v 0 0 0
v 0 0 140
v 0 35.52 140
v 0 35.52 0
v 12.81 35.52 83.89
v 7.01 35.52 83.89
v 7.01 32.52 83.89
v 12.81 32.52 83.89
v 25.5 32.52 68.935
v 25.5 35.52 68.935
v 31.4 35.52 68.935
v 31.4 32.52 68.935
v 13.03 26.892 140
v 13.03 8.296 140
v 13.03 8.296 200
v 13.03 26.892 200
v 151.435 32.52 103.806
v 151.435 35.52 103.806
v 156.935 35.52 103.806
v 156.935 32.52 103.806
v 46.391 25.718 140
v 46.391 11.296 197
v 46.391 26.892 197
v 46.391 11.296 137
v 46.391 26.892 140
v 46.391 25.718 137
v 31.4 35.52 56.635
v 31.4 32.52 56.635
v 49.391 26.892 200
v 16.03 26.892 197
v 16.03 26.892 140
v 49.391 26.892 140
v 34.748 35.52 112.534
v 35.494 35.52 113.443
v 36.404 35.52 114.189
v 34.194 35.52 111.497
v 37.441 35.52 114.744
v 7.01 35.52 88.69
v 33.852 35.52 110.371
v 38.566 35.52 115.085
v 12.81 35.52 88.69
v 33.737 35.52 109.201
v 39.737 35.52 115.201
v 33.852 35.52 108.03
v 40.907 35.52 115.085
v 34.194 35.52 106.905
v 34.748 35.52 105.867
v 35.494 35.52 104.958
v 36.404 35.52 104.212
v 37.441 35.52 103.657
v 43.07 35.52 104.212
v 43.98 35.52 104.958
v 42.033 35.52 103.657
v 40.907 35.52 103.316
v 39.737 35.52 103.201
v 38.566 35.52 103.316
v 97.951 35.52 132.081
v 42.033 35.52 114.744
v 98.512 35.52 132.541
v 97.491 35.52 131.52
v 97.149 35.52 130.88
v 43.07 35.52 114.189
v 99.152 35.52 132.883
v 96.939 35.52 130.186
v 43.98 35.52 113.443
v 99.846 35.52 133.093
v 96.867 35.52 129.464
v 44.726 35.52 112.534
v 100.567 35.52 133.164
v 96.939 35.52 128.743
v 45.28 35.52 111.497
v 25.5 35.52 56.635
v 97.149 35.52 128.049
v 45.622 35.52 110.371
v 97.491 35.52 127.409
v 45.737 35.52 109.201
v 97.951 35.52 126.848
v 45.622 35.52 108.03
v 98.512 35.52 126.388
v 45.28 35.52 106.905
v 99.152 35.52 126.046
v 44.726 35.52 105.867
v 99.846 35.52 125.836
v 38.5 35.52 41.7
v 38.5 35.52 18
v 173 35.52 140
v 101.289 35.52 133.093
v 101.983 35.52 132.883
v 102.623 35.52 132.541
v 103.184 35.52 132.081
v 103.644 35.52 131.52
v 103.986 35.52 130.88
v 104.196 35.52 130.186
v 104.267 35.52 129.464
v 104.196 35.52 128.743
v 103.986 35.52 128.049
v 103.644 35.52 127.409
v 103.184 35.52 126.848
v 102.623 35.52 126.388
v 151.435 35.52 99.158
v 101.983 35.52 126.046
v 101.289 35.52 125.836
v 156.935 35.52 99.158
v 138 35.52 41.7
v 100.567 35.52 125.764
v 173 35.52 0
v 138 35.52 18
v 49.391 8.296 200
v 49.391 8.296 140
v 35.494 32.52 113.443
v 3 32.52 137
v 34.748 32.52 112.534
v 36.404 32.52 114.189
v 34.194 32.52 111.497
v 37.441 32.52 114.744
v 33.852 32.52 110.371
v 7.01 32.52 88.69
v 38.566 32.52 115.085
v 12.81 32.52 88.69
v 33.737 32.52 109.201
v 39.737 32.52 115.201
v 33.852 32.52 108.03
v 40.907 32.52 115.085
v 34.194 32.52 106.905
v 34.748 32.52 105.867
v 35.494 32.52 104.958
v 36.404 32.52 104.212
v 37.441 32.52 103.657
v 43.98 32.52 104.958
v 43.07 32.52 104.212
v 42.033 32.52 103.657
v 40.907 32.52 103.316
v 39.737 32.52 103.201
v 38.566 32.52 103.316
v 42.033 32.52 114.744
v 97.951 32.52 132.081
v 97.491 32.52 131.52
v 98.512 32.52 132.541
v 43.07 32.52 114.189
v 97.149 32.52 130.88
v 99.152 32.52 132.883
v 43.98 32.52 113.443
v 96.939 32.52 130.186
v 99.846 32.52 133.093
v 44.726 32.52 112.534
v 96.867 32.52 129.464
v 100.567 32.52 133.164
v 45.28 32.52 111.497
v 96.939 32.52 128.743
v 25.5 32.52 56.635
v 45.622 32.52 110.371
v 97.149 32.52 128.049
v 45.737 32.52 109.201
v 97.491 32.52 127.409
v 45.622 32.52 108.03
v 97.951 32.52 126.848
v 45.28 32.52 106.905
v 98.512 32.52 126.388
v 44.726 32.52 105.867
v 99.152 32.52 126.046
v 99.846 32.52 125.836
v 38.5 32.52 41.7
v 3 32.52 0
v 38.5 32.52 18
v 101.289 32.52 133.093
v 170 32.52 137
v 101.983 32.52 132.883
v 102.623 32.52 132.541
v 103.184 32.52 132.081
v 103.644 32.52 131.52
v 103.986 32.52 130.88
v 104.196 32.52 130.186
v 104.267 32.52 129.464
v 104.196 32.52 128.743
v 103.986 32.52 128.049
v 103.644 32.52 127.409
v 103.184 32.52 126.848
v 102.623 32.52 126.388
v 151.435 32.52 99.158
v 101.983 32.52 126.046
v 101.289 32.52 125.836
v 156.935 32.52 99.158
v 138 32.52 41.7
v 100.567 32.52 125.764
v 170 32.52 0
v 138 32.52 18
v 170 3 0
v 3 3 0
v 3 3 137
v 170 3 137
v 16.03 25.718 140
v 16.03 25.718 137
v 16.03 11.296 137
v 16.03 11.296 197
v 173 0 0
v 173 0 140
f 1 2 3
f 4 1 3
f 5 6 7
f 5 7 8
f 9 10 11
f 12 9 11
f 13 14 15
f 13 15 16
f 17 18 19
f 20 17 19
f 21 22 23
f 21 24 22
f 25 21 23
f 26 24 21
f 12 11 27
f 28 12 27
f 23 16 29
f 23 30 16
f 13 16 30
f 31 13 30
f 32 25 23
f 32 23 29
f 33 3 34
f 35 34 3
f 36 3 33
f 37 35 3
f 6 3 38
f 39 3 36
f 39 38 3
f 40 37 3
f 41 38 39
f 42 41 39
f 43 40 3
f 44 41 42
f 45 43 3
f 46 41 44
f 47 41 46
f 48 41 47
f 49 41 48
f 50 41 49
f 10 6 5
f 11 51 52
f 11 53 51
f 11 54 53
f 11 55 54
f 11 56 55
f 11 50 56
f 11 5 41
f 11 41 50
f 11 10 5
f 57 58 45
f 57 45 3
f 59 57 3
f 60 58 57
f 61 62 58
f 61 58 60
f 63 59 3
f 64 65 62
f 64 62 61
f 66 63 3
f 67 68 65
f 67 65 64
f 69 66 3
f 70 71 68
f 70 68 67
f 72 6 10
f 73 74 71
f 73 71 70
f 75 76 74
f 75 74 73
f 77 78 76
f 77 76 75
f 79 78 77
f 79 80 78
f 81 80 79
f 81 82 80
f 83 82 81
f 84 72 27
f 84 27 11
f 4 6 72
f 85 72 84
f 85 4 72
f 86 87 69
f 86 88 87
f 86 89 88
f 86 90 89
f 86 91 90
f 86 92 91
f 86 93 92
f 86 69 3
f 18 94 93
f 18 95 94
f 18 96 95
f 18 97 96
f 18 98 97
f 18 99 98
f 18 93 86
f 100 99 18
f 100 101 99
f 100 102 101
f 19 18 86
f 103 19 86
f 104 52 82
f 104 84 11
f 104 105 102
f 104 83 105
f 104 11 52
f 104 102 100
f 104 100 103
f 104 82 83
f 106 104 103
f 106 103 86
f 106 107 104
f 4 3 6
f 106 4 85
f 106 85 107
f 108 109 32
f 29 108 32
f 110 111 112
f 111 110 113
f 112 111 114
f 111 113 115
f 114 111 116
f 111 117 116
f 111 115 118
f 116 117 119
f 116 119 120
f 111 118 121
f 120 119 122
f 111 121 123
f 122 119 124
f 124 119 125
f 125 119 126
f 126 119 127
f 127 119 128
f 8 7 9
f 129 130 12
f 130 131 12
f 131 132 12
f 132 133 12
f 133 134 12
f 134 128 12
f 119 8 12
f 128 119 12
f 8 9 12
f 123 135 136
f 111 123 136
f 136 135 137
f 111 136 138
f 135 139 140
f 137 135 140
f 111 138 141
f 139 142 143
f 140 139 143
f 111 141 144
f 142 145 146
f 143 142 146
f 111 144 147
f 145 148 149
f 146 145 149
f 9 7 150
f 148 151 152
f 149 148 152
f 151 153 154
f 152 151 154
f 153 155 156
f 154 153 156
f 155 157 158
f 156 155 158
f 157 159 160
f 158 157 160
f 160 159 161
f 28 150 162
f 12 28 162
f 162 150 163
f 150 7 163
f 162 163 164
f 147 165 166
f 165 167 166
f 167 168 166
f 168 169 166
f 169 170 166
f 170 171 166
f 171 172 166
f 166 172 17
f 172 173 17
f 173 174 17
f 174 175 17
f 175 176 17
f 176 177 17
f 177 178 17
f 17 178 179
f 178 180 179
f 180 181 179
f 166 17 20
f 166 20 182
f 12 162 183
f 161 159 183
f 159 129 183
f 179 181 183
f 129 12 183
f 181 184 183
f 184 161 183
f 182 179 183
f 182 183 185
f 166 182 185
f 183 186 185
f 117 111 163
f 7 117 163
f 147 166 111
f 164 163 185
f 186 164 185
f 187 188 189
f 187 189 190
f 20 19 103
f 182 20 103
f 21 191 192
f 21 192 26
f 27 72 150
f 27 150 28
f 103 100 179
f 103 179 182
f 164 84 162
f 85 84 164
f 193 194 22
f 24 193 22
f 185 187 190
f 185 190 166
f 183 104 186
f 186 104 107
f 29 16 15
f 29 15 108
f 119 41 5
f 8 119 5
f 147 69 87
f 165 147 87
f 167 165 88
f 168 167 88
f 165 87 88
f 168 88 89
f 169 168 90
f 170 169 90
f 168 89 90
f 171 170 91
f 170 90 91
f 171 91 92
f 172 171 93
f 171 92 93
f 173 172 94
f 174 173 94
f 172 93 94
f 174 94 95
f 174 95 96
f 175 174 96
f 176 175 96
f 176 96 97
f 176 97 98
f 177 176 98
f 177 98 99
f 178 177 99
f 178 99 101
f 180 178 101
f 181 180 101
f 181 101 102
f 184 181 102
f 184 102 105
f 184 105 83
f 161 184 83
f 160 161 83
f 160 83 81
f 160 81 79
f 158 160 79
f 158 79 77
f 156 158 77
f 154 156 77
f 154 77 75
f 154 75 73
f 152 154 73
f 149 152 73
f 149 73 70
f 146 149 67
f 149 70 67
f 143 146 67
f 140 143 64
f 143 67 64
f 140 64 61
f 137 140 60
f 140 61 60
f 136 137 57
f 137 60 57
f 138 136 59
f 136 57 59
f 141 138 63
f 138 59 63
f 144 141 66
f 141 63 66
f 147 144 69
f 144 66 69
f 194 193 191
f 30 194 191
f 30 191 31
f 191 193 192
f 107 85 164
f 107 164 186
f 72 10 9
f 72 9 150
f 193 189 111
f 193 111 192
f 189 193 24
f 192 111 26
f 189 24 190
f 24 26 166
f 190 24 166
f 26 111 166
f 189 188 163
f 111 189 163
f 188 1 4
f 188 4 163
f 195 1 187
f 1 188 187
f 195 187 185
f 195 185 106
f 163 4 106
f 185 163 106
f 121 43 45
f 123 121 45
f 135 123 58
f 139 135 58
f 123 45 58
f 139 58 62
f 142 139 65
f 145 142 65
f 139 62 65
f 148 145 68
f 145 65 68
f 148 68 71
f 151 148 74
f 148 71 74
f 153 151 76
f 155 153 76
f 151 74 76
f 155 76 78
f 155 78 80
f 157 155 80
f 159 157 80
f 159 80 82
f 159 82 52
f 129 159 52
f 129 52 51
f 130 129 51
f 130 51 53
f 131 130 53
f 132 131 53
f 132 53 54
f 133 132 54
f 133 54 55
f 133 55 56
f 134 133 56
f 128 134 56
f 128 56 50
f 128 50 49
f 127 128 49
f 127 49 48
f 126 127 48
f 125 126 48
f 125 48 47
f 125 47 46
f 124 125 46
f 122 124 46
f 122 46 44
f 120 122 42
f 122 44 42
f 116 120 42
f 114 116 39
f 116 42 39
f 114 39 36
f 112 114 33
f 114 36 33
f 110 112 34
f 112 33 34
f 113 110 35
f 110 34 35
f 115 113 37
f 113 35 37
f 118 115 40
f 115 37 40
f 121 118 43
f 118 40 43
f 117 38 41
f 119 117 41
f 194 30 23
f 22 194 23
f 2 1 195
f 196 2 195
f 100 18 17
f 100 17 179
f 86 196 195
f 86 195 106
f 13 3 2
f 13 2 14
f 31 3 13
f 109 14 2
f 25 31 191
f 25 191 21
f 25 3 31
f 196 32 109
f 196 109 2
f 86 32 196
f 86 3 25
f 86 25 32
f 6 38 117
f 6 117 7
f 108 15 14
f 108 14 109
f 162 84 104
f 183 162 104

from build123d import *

# Parameters (mm, degrees)
SKETCH1_W           = 173
SKETCH1_H           = 35.519872746
BOSS_EXTRUDE2_DEPTH = 140
SHELL3_T            = -3
SKETCH3_R           = 6
SKETCH3_R_2         = 3.7
SKETCH3_W           = 99.5
SKETCH3_H           = 23.7
SKETCH3_W_2         = 5.9
SKETCH3_H_2         = 12.3
SKETCH3_W_3         = 5.800374035
SKETCH3_H_3         = 4.8
SKETCH3_W_4         = 5.5
SKETCH3_H_4         = 4.647872836
CUT_EXTRUDE3_DEPTH  = 7.5
SKETCH5_W           = 36.361516307
SKETCH5_H           = 18.595843956
BOSS_EXTRUDE4_DEPTH = 60
SHELL5_START        = 140
SHELL5_OUTLINE_W    = 30.361516307
SHELL5_OUTLINE_H    = 15.595843956
SHELL5_DEPTH        = 57
SKETCH8_W           = 30.361516307
SKETCH8_H           = 14.422474908
CUT_EXTRUDE6_DEPTH  = 20.5


# Read off the part's stored shape, not the designer's step: Shell5
with BuildPart() as part:
    # Sketch1 → Boss-Extrude2 (new body)
    with BuildSketch(Plane.XY):
        with Locations((86.5, 17.759936373)):
            Rectangle(SKETCH1_W, SKETCH1_H)
    extrude(amount=BOSS_EXTRUDE2_DEPTH)

    # Shell3
    shell3_openings = [part.faces().sort_by_distance(p)[0] for p in [
        (86.5, 17.759936373, 0),
    ]]
    offset(amount=SHELL3_T, openings=shell3_openings, kind=Kind.INTERSECTION)

    # Sketch3 → Cut-Extrude3 (cut)
    with BuildSketch(Plane(origin=(0, 35.519872746, 0), x_dir=(1, 0, 0), z_dir=(0, 1, 0))):
        with Locations(Location((39.736956851, -109.200672262, 0), (0, 0, 270))):
            Circle(SKETCH3_R)
        with Locations(Location((100.567495644, -129.464431968, 0), (0, 0, 270))):
            Circle(SKETCH3_R_2)
        with Locations((88.25, -29.85)):
            Rectangle(SKETCH3_W, SKETCH3_H)
        with Locations((28.45, -62.785125048)):
            Rectangle(SKETCH3_W_2, SKETCH3_H_2)
        with Locations((9.910075314, -86.290425048)):
            Rectangle(SKETCH3_W_3, SKETCH3_H_3)
        with Locations((154.184914317, -101.481582974)):
            Rectangle(SKETCH3_W_4, SKETCH3_H_4)
    extrude(amount=-CUT_EXTRUDE3_DEPTH, mode=Mode.SUBTRACT)

    # Sketch5 → Boss-Extrude4 (add)
    with BuildSketch(Plane.XY.offset(140)):
        with Locations((31.210571096, 17.593902052)):
            Rectangle(SKETCH5_W, SKETCH5_H)
    extrude(amount=BOSS_EXTRUDE4_DEPTH)

    # Shell5 outline → Shell5 (cut)
    with BuildSketch(Plane.XY.offset(SHELL5_START)):
        with Locations((31.210571096, 19.093902052)):
            Rectangle(SHELL5_OUTLINE_W, SHELL5_OUTLINE_H)
    extrude(amount=SHELL5_DEPTH, mode=Mode.SUBTRACT)

    # Sketch8 → Cut-Extrude6 (cut)
    with BuildSketch(Plane.XY.offset(140)):
        with Locations((31.210571096, 18.507217528)):
            Rectangle(SKETCH8_W, SKETCH8_H)
    extrude(amount=-CUT_EXTRUDE6_DEPTH, mode=Mode.SUBTRACT)


solid = part.part
